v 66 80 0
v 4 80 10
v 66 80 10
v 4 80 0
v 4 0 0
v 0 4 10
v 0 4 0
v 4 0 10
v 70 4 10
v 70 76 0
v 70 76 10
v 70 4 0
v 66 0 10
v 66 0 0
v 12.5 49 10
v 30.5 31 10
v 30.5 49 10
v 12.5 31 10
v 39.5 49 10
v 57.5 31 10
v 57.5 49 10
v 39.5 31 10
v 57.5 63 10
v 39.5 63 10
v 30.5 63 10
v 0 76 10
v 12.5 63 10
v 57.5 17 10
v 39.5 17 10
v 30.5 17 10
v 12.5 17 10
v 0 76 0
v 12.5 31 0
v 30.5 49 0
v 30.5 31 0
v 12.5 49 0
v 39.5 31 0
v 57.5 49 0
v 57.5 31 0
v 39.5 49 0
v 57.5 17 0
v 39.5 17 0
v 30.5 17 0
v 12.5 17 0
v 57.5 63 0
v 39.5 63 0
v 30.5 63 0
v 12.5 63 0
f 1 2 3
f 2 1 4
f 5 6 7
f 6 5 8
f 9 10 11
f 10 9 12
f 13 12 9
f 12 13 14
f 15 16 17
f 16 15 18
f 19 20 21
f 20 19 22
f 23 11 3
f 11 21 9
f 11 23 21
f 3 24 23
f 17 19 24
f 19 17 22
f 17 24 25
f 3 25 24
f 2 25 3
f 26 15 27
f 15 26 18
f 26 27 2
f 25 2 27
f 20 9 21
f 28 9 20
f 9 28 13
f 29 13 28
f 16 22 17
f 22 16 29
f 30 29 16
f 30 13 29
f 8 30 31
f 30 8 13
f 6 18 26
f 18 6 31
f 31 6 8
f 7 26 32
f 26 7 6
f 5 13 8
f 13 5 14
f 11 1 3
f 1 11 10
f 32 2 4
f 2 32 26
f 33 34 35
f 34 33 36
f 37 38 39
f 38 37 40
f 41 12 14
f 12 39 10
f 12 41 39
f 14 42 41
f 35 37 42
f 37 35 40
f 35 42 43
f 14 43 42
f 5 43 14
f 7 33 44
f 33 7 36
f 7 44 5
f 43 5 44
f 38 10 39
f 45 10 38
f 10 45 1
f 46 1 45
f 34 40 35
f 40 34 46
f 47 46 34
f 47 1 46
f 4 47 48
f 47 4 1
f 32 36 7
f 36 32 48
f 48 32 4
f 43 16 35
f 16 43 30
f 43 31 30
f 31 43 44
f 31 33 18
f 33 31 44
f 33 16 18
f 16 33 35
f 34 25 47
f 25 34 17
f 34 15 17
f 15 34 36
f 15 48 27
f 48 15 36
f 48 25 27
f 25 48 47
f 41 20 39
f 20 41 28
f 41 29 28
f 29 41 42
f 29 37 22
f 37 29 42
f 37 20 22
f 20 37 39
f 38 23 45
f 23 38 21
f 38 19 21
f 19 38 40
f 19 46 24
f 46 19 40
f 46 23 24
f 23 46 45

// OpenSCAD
$fn = 32;

// ----------------------------------------------------------------------
// Windowed plate: 4 voids, 70 x 80 x 10 mm
// ----------------------------------------------------------------------

// --- parameters (mm) ---
plate_l = 70;             // plate length, X
plate_w = 80;             // plate width, Y
plate_t = 10;             // plate thickness, Z
edge_margin = 8;          // wall from the plate edge to any window
win_l = 18;               // pocket length
win_w = 14;               // pocket width
pitch_x = 27;             // grid pitch along X
pitch_y = 32;             // grid pitch along Y
depth_1 = 10;             // depth of void 1 (full thickness = through)
depth_2 = 10;             // depth of void 2 (full thickness = through)
depth_3 = 10;             // depth of void 3 (full thickness = through)
depth_4 = 10;             // depth of void 4 (full thickness = through)
corner_c = 4;             // corner chamfer of the plate

profile = [[4, 0], [66, 0], [70, 4], [70, 76], [66, 80], [4, 80], [0, 76], [0, 4]];  // primary outline, 8 points, counter clockwise
void_1 = [[12.5, 17], [30.5, 17], [30.5, 31], [12.5, 31]];  // pocket at grid node 0,0, 4 points
void_2 = [[12.5, 49], [30.5, 49], [30.5, 63], [12.5, 63]];  // pocket at grid node 0,1, 4 points
void_3 = [[39.5, 17], [57.5, 17], [57.5, 31], [39.5, 31]];  // pocket at grid node 1,0, 4 points
void_4 = [[39.5, 49], [57.5, 49], [57.5, 63], [39.5, 63]];  // pocket at grid node 1,1, 4 points

// --- the one profile operation ---
difference() {
  linear_extrude(height = plate_t) polygon(points = profile);
  translate([0, 0, -1])
    linear_extrude(height = plate_t + 2) polygon(points = void_1);
  translate([0, 0, -1])
    linear_extrude(height = plate_t + 2) polygon(points = void_2);
  translate([0, 0, -1])
    linear_extrude(height = plate_t + 2) polygon(points = void_3);
  translate([0, 0, -1])
    linear_extrude(height = plate_t + 2) polygon(points = void_4);
}
